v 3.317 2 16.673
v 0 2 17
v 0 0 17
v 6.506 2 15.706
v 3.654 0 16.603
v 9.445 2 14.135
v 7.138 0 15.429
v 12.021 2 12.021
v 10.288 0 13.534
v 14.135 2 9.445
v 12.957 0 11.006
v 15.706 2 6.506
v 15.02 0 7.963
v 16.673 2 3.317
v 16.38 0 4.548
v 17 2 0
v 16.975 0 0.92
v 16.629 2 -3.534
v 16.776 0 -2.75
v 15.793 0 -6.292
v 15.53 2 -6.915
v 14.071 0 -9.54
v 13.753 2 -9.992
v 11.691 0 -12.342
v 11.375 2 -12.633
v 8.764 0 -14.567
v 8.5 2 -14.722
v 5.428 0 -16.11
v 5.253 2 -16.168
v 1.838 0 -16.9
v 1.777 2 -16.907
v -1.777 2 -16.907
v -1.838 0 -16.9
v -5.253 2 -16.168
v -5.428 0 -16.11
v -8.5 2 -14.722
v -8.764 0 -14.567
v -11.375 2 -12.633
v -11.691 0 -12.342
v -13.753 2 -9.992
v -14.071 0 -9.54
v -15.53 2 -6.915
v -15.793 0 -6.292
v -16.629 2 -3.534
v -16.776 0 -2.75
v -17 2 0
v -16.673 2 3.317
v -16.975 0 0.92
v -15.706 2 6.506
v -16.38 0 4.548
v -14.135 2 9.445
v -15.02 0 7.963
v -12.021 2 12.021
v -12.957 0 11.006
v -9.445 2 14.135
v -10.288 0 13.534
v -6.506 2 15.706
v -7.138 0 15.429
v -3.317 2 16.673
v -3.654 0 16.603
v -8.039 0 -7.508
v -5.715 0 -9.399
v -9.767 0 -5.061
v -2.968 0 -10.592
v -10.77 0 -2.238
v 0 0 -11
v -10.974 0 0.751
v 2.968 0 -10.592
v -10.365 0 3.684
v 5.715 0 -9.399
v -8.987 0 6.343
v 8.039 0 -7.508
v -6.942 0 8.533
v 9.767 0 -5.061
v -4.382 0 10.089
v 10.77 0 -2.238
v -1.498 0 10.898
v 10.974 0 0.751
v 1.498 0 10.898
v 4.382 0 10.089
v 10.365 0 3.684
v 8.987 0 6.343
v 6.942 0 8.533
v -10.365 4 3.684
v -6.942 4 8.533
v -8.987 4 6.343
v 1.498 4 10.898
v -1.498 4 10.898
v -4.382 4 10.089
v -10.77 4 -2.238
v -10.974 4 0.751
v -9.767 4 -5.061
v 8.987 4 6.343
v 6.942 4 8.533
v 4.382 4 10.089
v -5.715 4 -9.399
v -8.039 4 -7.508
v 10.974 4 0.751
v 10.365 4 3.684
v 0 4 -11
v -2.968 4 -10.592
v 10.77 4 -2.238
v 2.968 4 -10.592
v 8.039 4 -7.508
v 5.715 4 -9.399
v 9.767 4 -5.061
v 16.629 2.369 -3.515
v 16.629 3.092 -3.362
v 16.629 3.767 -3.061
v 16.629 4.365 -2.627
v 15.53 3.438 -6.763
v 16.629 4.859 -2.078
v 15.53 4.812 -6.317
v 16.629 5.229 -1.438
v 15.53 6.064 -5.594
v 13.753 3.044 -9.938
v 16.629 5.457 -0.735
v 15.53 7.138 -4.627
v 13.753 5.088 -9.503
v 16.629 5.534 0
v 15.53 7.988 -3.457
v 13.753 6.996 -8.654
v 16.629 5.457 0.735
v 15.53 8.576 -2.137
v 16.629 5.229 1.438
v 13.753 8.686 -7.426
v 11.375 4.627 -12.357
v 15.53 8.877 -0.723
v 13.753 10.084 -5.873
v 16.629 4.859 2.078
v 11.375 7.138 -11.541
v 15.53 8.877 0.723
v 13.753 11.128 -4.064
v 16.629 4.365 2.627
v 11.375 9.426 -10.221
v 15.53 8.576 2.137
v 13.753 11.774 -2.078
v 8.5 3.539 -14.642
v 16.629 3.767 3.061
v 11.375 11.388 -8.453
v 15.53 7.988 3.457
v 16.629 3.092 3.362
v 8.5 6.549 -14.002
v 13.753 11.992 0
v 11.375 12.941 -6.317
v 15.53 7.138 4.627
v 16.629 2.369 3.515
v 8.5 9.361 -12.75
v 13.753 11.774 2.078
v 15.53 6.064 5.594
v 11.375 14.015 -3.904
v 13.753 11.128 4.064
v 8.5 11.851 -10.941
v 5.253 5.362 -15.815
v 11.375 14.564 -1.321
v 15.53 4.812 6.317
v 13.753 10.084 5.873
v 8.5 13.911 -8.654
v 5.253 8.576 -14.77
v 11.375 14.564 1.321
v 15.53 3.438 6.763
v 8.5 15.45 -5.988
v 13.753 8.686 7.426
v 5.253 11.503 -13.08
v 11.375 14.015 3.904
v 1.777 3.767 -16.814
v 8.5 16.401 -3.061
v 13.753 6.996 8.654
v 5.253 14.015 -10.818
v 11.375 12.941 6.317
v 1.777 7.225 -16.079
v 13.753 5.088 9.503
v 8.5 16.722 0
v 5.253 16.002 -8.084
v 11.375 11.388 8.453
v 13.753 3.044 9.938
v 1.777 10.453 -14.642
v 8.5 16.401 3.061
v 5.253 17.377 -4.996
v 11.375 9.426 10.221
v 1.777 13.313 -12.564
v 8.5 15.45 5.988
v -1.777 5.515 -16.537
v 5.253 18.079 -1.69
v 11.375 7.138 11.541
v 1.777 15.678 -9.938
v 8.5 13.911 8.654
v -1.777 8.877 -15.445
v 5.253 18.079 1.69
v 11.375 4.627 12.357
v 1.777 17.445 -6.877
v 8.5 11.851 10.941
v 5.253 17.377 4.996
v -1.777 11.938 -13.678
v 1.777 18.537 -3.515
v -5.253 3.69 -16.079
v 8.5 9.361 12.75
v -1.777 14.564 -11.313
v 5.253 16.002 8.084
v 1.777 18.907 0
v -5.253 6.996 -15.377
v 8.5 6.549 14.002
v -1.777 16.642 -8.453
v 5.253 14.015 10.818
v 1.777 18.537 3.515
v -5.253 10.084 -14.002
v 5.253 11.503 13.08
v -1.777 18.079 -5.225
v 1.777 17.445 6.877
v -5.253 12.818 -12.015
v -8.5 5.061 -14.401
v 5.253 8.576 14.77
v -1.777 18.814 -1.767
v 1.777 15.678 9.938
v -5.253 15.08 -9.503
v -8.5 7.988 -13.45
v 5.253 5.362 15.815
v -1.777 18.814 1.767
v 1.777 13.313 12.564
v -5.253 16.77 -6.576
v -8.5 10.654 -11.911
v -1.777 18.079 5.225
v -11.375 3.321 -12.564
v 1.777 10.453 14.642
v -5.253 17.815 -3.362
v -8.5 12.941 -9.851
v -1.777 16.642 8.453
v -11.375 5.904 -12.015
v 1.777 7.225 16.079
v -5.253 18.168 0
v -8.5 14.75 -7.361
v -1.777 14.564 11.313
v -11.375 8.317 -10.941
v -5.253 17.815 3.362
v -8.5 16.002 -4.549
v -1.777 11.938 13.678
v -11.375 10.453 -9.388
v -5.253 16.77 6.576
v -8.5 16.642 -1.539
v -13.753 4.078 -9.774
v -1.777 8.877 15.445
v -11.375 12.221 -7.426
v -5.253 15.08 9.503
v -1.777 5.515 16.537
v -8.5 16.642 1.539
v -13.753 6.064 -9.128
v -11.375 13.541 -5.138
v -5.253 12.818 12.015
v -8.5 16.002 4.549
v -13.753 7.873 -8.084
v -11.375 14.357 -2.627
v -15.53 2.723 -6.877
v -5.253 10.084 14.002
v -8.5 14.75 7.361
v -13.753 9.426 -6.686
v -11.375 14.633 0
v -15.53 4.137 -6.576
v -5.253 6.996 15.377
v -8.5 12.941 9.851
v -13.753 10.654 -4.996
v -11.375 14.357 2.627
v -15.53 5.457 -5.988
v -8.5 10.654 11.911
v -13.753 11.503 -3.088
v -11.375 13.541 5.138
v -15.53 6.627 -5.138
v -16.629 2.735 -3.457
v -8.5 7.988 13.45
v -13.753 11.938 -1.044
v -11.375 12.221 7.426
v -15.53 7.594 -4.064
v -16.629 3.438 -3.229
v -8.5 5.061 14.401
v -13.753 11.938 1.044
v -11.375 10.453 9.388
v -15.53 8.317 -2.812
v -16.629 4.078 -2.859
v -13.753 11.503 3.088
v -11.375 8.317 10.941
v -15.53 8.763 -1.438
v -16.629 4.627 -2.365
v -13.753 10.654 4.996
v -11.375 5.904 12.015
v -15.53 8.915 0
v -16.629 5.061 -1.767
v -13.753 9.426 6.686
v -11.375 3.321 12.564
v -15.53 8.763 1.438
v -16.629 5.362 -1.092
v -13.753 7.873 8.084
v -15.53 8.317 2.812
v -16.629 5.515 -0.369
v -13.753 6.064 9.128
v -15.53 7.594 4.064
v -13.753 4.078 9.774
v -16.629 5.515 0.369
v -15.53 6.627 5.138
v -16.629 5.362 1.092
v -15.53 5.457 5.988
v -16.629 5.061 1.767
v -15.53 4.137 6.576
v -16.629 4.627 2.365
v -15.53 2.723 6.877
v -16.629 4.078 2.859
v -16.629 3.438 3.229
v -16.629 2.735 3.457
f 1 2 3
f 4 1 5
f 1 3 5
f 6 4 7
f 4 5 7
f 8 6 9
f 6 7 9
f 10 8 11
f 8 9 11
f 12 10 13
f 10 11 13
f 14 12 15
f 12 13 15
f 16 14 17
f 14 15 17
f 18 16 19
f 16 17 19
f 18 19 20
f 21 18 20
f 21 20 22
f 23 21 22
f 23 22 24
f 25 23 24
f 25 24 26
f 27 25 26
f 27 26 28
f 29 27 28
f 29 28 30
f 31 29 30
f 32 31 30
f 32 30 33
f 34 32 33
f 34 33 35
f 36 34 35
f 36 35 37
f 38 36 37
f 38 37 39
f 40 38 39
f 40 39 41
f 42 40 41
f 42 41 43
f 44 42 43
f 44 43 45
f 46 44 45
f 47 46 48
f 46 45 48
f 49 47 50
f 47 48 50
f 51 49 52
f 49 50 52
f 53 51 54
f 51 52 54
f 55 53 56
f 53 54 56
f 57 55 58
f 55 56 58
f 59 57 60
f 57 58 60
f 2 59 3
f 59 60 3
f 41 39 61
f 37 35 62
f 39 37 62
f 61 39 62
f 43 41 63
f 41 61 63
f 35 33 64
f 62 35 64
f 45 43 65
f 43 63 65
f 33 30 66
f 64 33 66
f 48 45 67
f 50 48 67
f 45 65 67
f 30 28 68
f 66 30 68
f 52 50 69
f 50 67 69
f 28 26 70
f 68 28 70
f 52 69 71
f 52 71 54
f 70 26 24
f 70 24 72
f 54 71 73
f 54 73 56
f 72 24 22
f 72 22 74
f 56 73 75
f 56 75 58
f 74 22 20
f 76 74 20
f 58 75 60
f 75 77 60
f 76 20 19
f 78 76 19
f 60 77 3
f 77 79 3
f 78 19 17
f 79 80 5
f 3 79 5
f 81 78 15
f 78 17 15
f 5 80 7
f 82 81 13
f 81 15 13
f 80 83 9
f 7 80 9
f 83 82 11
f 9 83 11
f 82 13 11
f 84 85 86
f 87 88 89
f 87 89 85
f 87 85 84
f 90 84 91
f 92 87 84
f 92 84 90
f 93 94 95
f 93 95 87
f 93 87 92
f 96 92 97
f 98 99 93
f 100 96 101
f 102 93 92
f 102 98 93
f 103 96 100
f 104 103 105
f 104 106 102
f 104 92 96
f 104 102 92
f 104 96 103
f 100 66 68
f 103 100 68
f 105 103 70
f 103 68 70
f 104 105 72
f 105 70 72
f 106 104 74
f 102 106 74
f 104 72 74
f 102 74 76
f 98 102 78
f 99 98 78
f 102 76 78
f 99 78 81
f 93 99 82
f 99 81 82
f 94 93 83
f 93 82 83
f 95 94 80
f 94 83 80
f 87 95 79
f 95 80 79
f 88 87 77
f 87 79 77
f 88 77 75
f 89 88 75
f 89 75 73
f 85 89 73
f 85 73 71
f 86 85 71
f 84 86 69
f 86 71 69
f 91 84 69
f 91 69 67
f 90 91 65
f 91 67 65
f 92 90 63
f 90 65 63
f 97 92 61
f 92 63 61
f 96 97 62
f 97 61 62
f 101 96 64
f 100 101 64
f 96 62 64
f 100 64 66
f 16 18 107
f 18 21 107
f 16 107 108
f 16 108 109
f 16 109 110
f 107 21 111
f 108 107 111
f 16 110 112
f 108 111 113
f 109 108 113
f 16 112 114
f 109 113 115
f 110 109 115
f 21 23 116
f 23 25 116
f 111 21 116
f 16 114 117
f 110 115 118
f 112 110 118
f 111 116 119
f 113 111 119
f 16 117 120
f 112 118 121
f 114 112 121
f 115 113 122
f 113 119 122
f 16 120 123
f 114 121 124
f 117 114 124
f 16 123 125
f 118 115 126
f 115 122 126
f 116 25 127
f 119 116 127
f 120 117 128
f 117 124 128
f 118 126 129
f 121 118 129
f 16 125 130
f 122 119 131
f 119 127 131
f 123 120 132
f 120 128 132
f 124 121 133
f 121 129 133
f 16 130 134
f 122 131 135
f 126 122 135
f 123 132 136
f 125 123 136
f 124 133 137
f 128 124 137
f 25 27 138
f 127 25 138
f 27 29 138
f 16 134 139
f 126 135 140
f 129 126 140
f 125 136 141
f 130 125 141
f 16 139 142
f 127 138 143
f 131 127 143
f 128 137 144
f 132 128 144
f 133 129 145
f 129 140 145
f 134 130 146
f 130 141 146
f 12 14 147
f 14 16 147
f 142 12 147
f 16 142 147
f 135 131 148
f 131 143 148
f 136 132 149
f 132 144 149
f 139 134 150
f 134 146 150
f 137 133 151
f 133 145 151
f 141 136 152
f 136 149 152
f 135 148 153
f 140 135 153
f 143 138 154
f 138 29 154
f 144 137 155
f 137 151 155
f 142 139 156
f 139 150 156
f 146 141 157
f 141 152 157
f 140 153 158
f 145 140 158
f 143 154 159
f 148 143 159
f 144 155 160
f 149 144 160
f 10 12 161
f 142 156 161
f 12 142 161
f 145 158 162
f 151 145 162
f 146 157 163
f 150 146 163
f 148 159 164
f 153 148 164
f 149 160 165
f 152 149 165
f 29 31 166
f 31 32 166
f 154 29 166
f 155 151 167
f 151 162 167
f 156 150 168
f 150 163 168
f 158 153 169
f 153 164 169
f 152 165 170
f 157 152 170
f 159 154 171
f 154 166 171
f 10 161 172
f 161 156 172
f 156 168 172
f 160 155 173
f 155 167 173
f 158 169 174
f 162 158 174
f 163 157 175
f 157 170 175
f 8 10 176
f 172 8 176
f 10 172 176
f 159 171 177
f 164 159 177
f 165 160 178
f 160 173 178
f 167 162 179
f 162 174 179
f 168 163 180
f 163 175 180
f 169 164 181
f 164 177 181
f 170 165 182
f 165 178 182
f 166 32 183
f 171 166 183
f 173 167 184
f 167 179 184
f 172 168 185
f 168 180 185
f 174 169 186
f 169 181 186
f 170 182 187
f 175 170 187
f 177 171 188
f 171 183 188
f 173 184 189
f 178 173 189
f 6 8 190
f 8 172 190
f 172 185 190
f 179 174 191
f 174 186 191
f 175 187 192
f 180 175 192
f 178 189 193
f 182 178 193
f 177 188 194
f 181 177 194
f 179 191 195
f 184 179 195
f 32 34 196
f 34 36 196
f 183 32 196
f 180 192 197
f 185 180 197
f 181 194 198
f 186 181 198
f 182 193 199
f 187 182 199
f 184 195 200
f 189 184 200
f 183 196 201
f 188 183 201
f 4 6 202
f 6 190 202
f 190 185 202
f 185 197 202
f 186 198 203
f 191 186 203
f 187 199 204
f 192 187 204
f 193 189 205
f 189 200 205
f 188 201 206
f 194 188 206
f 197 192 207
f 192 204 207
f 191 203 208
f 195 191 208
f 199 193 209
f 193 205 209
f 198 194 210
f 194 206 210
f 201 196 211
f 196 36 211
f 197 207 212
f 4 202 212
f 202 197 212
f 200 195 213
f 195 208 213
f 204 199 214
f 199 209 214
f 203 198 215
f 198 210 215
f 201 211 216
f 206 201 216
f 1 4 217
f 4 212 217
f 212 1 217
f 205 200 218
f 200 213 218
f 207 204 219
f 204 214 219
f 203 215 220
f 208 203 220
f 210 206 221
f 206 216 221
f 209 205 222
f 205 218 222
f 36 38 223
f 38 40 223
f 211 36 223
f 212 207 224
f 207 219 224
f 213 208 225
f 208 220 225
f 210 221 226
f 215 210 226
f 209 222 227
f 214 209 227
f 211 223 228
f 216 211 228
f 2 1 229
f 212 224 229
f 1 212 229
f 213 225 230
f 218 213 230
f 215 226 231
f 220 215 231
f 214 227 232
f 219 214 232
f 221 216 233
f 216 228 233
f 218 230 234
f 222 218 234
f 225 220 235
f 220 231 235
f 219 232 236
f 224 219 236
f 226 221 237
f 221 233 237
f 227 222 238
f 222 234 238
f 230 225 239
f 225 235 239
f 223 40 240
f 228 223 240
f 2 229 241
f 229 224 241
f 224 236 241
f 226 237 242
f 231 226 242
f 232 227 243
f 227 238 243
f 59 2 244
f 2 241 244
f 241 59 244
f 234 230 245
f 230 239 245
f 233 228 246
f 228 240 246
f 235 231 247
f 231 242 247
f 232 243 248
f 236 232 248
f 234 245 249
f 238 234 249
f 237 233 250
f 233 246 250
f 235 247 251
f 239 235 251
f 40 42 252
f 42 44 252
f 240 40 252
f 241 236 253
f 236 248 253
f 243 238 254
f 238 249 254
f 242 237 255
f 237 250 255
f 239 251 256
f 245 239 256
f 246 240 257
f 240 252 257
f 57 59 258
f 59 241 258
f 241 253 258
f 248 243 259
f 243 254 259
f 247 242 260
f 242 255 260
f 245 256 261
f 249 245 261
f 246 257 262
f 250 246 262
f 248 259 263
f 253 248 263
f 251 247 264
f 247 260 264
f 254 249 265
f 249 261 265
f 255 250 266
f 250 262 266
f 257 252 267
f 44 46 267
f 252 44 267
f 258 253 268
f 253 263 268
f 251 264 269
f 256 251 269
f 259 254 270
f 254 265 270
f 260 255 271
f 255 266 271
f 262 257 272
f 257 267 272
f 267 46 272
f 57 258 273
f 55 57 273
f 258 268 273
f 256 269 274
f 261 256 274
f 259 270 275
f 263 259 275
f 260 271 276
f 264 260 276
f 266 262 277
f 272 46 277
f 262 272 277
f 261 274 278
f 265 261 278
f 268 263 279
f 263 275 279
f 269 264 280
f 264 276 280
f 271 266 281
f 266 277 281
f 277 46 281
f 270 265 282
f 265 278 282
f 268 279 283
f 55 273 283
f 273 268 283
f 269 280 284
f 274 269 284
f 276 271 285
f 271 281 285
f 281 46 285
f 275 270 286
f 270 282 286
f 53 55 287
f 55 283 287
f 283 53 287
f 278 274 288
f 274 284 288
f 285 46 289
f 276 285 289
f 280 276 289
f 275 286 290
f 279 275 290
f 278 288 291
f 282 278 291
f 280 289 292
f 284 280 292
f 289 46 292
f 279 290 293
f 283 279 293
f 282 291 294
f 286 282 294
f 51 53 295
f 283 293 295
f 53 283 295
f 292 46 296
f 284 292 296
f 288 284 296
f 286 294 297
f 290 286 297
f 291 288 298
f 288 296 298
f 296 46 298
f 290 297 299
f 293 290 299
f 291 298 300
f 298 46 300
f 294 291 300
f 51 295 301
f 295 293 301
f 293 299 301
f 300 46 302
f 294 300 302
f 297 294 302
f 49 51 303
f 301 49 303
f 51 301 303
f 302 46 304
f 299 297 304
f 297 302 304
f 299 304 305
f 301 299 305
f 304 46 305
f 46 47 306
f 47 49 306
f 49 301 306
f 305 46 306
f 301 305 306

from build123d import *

# Parameters (mm, degrees)
SKETCH1_R           = 17
BOSS_EXTRUDE1_DEPTH = 2
REVOLVE1_ANGLE      = 180
SKETCH3_R           = 11
CUT_EXTRUDE1_DEPTH  = 4


with BuildPart() as part:
    # Sketch1 → Boss-Extrude1 (new body)
    with BuildSketch(Plane(origin=(0, 0, 0), x_dir=(1, 0, 0), z_dir=(0, 1, 0))):
        with Locations(Location((0, 0, 0), (0, 0, 270))):
            Circle(SKETCH1_R)
    extrude(amount=BOSS_EXTRUDE1_DEPTH)

    # Sketch2 → Revolve1 (revolve)
    with BuildSketch(Plane(origin=(0, 2, 0), x_dir=(1, 0, 0), z_dir=(0, 1, 0))):
        with BuildLine():
            Line((-17, 0), (17, 0))
            ThreePointArc((17, 0), (0, 17), (-17, 0))
        make_face()
    revolve(axis=Axis((-17, 2, 0), (1, 0, 0)), revolution_arc=REVOLVE1_ANGLE)

    # Sketch3 → Cut-Extrude1 (cut)
    with BuildSketch(Plane.XZ):
        with Locations(Location((0, 0, 0), (0, 0, 270))):
            Circle(SKETCH3_R)
    extrude(amount=-CUT_EXTRUDE1_DEPTH, mode=Mode.SUBTRACT)


solid = part.part
